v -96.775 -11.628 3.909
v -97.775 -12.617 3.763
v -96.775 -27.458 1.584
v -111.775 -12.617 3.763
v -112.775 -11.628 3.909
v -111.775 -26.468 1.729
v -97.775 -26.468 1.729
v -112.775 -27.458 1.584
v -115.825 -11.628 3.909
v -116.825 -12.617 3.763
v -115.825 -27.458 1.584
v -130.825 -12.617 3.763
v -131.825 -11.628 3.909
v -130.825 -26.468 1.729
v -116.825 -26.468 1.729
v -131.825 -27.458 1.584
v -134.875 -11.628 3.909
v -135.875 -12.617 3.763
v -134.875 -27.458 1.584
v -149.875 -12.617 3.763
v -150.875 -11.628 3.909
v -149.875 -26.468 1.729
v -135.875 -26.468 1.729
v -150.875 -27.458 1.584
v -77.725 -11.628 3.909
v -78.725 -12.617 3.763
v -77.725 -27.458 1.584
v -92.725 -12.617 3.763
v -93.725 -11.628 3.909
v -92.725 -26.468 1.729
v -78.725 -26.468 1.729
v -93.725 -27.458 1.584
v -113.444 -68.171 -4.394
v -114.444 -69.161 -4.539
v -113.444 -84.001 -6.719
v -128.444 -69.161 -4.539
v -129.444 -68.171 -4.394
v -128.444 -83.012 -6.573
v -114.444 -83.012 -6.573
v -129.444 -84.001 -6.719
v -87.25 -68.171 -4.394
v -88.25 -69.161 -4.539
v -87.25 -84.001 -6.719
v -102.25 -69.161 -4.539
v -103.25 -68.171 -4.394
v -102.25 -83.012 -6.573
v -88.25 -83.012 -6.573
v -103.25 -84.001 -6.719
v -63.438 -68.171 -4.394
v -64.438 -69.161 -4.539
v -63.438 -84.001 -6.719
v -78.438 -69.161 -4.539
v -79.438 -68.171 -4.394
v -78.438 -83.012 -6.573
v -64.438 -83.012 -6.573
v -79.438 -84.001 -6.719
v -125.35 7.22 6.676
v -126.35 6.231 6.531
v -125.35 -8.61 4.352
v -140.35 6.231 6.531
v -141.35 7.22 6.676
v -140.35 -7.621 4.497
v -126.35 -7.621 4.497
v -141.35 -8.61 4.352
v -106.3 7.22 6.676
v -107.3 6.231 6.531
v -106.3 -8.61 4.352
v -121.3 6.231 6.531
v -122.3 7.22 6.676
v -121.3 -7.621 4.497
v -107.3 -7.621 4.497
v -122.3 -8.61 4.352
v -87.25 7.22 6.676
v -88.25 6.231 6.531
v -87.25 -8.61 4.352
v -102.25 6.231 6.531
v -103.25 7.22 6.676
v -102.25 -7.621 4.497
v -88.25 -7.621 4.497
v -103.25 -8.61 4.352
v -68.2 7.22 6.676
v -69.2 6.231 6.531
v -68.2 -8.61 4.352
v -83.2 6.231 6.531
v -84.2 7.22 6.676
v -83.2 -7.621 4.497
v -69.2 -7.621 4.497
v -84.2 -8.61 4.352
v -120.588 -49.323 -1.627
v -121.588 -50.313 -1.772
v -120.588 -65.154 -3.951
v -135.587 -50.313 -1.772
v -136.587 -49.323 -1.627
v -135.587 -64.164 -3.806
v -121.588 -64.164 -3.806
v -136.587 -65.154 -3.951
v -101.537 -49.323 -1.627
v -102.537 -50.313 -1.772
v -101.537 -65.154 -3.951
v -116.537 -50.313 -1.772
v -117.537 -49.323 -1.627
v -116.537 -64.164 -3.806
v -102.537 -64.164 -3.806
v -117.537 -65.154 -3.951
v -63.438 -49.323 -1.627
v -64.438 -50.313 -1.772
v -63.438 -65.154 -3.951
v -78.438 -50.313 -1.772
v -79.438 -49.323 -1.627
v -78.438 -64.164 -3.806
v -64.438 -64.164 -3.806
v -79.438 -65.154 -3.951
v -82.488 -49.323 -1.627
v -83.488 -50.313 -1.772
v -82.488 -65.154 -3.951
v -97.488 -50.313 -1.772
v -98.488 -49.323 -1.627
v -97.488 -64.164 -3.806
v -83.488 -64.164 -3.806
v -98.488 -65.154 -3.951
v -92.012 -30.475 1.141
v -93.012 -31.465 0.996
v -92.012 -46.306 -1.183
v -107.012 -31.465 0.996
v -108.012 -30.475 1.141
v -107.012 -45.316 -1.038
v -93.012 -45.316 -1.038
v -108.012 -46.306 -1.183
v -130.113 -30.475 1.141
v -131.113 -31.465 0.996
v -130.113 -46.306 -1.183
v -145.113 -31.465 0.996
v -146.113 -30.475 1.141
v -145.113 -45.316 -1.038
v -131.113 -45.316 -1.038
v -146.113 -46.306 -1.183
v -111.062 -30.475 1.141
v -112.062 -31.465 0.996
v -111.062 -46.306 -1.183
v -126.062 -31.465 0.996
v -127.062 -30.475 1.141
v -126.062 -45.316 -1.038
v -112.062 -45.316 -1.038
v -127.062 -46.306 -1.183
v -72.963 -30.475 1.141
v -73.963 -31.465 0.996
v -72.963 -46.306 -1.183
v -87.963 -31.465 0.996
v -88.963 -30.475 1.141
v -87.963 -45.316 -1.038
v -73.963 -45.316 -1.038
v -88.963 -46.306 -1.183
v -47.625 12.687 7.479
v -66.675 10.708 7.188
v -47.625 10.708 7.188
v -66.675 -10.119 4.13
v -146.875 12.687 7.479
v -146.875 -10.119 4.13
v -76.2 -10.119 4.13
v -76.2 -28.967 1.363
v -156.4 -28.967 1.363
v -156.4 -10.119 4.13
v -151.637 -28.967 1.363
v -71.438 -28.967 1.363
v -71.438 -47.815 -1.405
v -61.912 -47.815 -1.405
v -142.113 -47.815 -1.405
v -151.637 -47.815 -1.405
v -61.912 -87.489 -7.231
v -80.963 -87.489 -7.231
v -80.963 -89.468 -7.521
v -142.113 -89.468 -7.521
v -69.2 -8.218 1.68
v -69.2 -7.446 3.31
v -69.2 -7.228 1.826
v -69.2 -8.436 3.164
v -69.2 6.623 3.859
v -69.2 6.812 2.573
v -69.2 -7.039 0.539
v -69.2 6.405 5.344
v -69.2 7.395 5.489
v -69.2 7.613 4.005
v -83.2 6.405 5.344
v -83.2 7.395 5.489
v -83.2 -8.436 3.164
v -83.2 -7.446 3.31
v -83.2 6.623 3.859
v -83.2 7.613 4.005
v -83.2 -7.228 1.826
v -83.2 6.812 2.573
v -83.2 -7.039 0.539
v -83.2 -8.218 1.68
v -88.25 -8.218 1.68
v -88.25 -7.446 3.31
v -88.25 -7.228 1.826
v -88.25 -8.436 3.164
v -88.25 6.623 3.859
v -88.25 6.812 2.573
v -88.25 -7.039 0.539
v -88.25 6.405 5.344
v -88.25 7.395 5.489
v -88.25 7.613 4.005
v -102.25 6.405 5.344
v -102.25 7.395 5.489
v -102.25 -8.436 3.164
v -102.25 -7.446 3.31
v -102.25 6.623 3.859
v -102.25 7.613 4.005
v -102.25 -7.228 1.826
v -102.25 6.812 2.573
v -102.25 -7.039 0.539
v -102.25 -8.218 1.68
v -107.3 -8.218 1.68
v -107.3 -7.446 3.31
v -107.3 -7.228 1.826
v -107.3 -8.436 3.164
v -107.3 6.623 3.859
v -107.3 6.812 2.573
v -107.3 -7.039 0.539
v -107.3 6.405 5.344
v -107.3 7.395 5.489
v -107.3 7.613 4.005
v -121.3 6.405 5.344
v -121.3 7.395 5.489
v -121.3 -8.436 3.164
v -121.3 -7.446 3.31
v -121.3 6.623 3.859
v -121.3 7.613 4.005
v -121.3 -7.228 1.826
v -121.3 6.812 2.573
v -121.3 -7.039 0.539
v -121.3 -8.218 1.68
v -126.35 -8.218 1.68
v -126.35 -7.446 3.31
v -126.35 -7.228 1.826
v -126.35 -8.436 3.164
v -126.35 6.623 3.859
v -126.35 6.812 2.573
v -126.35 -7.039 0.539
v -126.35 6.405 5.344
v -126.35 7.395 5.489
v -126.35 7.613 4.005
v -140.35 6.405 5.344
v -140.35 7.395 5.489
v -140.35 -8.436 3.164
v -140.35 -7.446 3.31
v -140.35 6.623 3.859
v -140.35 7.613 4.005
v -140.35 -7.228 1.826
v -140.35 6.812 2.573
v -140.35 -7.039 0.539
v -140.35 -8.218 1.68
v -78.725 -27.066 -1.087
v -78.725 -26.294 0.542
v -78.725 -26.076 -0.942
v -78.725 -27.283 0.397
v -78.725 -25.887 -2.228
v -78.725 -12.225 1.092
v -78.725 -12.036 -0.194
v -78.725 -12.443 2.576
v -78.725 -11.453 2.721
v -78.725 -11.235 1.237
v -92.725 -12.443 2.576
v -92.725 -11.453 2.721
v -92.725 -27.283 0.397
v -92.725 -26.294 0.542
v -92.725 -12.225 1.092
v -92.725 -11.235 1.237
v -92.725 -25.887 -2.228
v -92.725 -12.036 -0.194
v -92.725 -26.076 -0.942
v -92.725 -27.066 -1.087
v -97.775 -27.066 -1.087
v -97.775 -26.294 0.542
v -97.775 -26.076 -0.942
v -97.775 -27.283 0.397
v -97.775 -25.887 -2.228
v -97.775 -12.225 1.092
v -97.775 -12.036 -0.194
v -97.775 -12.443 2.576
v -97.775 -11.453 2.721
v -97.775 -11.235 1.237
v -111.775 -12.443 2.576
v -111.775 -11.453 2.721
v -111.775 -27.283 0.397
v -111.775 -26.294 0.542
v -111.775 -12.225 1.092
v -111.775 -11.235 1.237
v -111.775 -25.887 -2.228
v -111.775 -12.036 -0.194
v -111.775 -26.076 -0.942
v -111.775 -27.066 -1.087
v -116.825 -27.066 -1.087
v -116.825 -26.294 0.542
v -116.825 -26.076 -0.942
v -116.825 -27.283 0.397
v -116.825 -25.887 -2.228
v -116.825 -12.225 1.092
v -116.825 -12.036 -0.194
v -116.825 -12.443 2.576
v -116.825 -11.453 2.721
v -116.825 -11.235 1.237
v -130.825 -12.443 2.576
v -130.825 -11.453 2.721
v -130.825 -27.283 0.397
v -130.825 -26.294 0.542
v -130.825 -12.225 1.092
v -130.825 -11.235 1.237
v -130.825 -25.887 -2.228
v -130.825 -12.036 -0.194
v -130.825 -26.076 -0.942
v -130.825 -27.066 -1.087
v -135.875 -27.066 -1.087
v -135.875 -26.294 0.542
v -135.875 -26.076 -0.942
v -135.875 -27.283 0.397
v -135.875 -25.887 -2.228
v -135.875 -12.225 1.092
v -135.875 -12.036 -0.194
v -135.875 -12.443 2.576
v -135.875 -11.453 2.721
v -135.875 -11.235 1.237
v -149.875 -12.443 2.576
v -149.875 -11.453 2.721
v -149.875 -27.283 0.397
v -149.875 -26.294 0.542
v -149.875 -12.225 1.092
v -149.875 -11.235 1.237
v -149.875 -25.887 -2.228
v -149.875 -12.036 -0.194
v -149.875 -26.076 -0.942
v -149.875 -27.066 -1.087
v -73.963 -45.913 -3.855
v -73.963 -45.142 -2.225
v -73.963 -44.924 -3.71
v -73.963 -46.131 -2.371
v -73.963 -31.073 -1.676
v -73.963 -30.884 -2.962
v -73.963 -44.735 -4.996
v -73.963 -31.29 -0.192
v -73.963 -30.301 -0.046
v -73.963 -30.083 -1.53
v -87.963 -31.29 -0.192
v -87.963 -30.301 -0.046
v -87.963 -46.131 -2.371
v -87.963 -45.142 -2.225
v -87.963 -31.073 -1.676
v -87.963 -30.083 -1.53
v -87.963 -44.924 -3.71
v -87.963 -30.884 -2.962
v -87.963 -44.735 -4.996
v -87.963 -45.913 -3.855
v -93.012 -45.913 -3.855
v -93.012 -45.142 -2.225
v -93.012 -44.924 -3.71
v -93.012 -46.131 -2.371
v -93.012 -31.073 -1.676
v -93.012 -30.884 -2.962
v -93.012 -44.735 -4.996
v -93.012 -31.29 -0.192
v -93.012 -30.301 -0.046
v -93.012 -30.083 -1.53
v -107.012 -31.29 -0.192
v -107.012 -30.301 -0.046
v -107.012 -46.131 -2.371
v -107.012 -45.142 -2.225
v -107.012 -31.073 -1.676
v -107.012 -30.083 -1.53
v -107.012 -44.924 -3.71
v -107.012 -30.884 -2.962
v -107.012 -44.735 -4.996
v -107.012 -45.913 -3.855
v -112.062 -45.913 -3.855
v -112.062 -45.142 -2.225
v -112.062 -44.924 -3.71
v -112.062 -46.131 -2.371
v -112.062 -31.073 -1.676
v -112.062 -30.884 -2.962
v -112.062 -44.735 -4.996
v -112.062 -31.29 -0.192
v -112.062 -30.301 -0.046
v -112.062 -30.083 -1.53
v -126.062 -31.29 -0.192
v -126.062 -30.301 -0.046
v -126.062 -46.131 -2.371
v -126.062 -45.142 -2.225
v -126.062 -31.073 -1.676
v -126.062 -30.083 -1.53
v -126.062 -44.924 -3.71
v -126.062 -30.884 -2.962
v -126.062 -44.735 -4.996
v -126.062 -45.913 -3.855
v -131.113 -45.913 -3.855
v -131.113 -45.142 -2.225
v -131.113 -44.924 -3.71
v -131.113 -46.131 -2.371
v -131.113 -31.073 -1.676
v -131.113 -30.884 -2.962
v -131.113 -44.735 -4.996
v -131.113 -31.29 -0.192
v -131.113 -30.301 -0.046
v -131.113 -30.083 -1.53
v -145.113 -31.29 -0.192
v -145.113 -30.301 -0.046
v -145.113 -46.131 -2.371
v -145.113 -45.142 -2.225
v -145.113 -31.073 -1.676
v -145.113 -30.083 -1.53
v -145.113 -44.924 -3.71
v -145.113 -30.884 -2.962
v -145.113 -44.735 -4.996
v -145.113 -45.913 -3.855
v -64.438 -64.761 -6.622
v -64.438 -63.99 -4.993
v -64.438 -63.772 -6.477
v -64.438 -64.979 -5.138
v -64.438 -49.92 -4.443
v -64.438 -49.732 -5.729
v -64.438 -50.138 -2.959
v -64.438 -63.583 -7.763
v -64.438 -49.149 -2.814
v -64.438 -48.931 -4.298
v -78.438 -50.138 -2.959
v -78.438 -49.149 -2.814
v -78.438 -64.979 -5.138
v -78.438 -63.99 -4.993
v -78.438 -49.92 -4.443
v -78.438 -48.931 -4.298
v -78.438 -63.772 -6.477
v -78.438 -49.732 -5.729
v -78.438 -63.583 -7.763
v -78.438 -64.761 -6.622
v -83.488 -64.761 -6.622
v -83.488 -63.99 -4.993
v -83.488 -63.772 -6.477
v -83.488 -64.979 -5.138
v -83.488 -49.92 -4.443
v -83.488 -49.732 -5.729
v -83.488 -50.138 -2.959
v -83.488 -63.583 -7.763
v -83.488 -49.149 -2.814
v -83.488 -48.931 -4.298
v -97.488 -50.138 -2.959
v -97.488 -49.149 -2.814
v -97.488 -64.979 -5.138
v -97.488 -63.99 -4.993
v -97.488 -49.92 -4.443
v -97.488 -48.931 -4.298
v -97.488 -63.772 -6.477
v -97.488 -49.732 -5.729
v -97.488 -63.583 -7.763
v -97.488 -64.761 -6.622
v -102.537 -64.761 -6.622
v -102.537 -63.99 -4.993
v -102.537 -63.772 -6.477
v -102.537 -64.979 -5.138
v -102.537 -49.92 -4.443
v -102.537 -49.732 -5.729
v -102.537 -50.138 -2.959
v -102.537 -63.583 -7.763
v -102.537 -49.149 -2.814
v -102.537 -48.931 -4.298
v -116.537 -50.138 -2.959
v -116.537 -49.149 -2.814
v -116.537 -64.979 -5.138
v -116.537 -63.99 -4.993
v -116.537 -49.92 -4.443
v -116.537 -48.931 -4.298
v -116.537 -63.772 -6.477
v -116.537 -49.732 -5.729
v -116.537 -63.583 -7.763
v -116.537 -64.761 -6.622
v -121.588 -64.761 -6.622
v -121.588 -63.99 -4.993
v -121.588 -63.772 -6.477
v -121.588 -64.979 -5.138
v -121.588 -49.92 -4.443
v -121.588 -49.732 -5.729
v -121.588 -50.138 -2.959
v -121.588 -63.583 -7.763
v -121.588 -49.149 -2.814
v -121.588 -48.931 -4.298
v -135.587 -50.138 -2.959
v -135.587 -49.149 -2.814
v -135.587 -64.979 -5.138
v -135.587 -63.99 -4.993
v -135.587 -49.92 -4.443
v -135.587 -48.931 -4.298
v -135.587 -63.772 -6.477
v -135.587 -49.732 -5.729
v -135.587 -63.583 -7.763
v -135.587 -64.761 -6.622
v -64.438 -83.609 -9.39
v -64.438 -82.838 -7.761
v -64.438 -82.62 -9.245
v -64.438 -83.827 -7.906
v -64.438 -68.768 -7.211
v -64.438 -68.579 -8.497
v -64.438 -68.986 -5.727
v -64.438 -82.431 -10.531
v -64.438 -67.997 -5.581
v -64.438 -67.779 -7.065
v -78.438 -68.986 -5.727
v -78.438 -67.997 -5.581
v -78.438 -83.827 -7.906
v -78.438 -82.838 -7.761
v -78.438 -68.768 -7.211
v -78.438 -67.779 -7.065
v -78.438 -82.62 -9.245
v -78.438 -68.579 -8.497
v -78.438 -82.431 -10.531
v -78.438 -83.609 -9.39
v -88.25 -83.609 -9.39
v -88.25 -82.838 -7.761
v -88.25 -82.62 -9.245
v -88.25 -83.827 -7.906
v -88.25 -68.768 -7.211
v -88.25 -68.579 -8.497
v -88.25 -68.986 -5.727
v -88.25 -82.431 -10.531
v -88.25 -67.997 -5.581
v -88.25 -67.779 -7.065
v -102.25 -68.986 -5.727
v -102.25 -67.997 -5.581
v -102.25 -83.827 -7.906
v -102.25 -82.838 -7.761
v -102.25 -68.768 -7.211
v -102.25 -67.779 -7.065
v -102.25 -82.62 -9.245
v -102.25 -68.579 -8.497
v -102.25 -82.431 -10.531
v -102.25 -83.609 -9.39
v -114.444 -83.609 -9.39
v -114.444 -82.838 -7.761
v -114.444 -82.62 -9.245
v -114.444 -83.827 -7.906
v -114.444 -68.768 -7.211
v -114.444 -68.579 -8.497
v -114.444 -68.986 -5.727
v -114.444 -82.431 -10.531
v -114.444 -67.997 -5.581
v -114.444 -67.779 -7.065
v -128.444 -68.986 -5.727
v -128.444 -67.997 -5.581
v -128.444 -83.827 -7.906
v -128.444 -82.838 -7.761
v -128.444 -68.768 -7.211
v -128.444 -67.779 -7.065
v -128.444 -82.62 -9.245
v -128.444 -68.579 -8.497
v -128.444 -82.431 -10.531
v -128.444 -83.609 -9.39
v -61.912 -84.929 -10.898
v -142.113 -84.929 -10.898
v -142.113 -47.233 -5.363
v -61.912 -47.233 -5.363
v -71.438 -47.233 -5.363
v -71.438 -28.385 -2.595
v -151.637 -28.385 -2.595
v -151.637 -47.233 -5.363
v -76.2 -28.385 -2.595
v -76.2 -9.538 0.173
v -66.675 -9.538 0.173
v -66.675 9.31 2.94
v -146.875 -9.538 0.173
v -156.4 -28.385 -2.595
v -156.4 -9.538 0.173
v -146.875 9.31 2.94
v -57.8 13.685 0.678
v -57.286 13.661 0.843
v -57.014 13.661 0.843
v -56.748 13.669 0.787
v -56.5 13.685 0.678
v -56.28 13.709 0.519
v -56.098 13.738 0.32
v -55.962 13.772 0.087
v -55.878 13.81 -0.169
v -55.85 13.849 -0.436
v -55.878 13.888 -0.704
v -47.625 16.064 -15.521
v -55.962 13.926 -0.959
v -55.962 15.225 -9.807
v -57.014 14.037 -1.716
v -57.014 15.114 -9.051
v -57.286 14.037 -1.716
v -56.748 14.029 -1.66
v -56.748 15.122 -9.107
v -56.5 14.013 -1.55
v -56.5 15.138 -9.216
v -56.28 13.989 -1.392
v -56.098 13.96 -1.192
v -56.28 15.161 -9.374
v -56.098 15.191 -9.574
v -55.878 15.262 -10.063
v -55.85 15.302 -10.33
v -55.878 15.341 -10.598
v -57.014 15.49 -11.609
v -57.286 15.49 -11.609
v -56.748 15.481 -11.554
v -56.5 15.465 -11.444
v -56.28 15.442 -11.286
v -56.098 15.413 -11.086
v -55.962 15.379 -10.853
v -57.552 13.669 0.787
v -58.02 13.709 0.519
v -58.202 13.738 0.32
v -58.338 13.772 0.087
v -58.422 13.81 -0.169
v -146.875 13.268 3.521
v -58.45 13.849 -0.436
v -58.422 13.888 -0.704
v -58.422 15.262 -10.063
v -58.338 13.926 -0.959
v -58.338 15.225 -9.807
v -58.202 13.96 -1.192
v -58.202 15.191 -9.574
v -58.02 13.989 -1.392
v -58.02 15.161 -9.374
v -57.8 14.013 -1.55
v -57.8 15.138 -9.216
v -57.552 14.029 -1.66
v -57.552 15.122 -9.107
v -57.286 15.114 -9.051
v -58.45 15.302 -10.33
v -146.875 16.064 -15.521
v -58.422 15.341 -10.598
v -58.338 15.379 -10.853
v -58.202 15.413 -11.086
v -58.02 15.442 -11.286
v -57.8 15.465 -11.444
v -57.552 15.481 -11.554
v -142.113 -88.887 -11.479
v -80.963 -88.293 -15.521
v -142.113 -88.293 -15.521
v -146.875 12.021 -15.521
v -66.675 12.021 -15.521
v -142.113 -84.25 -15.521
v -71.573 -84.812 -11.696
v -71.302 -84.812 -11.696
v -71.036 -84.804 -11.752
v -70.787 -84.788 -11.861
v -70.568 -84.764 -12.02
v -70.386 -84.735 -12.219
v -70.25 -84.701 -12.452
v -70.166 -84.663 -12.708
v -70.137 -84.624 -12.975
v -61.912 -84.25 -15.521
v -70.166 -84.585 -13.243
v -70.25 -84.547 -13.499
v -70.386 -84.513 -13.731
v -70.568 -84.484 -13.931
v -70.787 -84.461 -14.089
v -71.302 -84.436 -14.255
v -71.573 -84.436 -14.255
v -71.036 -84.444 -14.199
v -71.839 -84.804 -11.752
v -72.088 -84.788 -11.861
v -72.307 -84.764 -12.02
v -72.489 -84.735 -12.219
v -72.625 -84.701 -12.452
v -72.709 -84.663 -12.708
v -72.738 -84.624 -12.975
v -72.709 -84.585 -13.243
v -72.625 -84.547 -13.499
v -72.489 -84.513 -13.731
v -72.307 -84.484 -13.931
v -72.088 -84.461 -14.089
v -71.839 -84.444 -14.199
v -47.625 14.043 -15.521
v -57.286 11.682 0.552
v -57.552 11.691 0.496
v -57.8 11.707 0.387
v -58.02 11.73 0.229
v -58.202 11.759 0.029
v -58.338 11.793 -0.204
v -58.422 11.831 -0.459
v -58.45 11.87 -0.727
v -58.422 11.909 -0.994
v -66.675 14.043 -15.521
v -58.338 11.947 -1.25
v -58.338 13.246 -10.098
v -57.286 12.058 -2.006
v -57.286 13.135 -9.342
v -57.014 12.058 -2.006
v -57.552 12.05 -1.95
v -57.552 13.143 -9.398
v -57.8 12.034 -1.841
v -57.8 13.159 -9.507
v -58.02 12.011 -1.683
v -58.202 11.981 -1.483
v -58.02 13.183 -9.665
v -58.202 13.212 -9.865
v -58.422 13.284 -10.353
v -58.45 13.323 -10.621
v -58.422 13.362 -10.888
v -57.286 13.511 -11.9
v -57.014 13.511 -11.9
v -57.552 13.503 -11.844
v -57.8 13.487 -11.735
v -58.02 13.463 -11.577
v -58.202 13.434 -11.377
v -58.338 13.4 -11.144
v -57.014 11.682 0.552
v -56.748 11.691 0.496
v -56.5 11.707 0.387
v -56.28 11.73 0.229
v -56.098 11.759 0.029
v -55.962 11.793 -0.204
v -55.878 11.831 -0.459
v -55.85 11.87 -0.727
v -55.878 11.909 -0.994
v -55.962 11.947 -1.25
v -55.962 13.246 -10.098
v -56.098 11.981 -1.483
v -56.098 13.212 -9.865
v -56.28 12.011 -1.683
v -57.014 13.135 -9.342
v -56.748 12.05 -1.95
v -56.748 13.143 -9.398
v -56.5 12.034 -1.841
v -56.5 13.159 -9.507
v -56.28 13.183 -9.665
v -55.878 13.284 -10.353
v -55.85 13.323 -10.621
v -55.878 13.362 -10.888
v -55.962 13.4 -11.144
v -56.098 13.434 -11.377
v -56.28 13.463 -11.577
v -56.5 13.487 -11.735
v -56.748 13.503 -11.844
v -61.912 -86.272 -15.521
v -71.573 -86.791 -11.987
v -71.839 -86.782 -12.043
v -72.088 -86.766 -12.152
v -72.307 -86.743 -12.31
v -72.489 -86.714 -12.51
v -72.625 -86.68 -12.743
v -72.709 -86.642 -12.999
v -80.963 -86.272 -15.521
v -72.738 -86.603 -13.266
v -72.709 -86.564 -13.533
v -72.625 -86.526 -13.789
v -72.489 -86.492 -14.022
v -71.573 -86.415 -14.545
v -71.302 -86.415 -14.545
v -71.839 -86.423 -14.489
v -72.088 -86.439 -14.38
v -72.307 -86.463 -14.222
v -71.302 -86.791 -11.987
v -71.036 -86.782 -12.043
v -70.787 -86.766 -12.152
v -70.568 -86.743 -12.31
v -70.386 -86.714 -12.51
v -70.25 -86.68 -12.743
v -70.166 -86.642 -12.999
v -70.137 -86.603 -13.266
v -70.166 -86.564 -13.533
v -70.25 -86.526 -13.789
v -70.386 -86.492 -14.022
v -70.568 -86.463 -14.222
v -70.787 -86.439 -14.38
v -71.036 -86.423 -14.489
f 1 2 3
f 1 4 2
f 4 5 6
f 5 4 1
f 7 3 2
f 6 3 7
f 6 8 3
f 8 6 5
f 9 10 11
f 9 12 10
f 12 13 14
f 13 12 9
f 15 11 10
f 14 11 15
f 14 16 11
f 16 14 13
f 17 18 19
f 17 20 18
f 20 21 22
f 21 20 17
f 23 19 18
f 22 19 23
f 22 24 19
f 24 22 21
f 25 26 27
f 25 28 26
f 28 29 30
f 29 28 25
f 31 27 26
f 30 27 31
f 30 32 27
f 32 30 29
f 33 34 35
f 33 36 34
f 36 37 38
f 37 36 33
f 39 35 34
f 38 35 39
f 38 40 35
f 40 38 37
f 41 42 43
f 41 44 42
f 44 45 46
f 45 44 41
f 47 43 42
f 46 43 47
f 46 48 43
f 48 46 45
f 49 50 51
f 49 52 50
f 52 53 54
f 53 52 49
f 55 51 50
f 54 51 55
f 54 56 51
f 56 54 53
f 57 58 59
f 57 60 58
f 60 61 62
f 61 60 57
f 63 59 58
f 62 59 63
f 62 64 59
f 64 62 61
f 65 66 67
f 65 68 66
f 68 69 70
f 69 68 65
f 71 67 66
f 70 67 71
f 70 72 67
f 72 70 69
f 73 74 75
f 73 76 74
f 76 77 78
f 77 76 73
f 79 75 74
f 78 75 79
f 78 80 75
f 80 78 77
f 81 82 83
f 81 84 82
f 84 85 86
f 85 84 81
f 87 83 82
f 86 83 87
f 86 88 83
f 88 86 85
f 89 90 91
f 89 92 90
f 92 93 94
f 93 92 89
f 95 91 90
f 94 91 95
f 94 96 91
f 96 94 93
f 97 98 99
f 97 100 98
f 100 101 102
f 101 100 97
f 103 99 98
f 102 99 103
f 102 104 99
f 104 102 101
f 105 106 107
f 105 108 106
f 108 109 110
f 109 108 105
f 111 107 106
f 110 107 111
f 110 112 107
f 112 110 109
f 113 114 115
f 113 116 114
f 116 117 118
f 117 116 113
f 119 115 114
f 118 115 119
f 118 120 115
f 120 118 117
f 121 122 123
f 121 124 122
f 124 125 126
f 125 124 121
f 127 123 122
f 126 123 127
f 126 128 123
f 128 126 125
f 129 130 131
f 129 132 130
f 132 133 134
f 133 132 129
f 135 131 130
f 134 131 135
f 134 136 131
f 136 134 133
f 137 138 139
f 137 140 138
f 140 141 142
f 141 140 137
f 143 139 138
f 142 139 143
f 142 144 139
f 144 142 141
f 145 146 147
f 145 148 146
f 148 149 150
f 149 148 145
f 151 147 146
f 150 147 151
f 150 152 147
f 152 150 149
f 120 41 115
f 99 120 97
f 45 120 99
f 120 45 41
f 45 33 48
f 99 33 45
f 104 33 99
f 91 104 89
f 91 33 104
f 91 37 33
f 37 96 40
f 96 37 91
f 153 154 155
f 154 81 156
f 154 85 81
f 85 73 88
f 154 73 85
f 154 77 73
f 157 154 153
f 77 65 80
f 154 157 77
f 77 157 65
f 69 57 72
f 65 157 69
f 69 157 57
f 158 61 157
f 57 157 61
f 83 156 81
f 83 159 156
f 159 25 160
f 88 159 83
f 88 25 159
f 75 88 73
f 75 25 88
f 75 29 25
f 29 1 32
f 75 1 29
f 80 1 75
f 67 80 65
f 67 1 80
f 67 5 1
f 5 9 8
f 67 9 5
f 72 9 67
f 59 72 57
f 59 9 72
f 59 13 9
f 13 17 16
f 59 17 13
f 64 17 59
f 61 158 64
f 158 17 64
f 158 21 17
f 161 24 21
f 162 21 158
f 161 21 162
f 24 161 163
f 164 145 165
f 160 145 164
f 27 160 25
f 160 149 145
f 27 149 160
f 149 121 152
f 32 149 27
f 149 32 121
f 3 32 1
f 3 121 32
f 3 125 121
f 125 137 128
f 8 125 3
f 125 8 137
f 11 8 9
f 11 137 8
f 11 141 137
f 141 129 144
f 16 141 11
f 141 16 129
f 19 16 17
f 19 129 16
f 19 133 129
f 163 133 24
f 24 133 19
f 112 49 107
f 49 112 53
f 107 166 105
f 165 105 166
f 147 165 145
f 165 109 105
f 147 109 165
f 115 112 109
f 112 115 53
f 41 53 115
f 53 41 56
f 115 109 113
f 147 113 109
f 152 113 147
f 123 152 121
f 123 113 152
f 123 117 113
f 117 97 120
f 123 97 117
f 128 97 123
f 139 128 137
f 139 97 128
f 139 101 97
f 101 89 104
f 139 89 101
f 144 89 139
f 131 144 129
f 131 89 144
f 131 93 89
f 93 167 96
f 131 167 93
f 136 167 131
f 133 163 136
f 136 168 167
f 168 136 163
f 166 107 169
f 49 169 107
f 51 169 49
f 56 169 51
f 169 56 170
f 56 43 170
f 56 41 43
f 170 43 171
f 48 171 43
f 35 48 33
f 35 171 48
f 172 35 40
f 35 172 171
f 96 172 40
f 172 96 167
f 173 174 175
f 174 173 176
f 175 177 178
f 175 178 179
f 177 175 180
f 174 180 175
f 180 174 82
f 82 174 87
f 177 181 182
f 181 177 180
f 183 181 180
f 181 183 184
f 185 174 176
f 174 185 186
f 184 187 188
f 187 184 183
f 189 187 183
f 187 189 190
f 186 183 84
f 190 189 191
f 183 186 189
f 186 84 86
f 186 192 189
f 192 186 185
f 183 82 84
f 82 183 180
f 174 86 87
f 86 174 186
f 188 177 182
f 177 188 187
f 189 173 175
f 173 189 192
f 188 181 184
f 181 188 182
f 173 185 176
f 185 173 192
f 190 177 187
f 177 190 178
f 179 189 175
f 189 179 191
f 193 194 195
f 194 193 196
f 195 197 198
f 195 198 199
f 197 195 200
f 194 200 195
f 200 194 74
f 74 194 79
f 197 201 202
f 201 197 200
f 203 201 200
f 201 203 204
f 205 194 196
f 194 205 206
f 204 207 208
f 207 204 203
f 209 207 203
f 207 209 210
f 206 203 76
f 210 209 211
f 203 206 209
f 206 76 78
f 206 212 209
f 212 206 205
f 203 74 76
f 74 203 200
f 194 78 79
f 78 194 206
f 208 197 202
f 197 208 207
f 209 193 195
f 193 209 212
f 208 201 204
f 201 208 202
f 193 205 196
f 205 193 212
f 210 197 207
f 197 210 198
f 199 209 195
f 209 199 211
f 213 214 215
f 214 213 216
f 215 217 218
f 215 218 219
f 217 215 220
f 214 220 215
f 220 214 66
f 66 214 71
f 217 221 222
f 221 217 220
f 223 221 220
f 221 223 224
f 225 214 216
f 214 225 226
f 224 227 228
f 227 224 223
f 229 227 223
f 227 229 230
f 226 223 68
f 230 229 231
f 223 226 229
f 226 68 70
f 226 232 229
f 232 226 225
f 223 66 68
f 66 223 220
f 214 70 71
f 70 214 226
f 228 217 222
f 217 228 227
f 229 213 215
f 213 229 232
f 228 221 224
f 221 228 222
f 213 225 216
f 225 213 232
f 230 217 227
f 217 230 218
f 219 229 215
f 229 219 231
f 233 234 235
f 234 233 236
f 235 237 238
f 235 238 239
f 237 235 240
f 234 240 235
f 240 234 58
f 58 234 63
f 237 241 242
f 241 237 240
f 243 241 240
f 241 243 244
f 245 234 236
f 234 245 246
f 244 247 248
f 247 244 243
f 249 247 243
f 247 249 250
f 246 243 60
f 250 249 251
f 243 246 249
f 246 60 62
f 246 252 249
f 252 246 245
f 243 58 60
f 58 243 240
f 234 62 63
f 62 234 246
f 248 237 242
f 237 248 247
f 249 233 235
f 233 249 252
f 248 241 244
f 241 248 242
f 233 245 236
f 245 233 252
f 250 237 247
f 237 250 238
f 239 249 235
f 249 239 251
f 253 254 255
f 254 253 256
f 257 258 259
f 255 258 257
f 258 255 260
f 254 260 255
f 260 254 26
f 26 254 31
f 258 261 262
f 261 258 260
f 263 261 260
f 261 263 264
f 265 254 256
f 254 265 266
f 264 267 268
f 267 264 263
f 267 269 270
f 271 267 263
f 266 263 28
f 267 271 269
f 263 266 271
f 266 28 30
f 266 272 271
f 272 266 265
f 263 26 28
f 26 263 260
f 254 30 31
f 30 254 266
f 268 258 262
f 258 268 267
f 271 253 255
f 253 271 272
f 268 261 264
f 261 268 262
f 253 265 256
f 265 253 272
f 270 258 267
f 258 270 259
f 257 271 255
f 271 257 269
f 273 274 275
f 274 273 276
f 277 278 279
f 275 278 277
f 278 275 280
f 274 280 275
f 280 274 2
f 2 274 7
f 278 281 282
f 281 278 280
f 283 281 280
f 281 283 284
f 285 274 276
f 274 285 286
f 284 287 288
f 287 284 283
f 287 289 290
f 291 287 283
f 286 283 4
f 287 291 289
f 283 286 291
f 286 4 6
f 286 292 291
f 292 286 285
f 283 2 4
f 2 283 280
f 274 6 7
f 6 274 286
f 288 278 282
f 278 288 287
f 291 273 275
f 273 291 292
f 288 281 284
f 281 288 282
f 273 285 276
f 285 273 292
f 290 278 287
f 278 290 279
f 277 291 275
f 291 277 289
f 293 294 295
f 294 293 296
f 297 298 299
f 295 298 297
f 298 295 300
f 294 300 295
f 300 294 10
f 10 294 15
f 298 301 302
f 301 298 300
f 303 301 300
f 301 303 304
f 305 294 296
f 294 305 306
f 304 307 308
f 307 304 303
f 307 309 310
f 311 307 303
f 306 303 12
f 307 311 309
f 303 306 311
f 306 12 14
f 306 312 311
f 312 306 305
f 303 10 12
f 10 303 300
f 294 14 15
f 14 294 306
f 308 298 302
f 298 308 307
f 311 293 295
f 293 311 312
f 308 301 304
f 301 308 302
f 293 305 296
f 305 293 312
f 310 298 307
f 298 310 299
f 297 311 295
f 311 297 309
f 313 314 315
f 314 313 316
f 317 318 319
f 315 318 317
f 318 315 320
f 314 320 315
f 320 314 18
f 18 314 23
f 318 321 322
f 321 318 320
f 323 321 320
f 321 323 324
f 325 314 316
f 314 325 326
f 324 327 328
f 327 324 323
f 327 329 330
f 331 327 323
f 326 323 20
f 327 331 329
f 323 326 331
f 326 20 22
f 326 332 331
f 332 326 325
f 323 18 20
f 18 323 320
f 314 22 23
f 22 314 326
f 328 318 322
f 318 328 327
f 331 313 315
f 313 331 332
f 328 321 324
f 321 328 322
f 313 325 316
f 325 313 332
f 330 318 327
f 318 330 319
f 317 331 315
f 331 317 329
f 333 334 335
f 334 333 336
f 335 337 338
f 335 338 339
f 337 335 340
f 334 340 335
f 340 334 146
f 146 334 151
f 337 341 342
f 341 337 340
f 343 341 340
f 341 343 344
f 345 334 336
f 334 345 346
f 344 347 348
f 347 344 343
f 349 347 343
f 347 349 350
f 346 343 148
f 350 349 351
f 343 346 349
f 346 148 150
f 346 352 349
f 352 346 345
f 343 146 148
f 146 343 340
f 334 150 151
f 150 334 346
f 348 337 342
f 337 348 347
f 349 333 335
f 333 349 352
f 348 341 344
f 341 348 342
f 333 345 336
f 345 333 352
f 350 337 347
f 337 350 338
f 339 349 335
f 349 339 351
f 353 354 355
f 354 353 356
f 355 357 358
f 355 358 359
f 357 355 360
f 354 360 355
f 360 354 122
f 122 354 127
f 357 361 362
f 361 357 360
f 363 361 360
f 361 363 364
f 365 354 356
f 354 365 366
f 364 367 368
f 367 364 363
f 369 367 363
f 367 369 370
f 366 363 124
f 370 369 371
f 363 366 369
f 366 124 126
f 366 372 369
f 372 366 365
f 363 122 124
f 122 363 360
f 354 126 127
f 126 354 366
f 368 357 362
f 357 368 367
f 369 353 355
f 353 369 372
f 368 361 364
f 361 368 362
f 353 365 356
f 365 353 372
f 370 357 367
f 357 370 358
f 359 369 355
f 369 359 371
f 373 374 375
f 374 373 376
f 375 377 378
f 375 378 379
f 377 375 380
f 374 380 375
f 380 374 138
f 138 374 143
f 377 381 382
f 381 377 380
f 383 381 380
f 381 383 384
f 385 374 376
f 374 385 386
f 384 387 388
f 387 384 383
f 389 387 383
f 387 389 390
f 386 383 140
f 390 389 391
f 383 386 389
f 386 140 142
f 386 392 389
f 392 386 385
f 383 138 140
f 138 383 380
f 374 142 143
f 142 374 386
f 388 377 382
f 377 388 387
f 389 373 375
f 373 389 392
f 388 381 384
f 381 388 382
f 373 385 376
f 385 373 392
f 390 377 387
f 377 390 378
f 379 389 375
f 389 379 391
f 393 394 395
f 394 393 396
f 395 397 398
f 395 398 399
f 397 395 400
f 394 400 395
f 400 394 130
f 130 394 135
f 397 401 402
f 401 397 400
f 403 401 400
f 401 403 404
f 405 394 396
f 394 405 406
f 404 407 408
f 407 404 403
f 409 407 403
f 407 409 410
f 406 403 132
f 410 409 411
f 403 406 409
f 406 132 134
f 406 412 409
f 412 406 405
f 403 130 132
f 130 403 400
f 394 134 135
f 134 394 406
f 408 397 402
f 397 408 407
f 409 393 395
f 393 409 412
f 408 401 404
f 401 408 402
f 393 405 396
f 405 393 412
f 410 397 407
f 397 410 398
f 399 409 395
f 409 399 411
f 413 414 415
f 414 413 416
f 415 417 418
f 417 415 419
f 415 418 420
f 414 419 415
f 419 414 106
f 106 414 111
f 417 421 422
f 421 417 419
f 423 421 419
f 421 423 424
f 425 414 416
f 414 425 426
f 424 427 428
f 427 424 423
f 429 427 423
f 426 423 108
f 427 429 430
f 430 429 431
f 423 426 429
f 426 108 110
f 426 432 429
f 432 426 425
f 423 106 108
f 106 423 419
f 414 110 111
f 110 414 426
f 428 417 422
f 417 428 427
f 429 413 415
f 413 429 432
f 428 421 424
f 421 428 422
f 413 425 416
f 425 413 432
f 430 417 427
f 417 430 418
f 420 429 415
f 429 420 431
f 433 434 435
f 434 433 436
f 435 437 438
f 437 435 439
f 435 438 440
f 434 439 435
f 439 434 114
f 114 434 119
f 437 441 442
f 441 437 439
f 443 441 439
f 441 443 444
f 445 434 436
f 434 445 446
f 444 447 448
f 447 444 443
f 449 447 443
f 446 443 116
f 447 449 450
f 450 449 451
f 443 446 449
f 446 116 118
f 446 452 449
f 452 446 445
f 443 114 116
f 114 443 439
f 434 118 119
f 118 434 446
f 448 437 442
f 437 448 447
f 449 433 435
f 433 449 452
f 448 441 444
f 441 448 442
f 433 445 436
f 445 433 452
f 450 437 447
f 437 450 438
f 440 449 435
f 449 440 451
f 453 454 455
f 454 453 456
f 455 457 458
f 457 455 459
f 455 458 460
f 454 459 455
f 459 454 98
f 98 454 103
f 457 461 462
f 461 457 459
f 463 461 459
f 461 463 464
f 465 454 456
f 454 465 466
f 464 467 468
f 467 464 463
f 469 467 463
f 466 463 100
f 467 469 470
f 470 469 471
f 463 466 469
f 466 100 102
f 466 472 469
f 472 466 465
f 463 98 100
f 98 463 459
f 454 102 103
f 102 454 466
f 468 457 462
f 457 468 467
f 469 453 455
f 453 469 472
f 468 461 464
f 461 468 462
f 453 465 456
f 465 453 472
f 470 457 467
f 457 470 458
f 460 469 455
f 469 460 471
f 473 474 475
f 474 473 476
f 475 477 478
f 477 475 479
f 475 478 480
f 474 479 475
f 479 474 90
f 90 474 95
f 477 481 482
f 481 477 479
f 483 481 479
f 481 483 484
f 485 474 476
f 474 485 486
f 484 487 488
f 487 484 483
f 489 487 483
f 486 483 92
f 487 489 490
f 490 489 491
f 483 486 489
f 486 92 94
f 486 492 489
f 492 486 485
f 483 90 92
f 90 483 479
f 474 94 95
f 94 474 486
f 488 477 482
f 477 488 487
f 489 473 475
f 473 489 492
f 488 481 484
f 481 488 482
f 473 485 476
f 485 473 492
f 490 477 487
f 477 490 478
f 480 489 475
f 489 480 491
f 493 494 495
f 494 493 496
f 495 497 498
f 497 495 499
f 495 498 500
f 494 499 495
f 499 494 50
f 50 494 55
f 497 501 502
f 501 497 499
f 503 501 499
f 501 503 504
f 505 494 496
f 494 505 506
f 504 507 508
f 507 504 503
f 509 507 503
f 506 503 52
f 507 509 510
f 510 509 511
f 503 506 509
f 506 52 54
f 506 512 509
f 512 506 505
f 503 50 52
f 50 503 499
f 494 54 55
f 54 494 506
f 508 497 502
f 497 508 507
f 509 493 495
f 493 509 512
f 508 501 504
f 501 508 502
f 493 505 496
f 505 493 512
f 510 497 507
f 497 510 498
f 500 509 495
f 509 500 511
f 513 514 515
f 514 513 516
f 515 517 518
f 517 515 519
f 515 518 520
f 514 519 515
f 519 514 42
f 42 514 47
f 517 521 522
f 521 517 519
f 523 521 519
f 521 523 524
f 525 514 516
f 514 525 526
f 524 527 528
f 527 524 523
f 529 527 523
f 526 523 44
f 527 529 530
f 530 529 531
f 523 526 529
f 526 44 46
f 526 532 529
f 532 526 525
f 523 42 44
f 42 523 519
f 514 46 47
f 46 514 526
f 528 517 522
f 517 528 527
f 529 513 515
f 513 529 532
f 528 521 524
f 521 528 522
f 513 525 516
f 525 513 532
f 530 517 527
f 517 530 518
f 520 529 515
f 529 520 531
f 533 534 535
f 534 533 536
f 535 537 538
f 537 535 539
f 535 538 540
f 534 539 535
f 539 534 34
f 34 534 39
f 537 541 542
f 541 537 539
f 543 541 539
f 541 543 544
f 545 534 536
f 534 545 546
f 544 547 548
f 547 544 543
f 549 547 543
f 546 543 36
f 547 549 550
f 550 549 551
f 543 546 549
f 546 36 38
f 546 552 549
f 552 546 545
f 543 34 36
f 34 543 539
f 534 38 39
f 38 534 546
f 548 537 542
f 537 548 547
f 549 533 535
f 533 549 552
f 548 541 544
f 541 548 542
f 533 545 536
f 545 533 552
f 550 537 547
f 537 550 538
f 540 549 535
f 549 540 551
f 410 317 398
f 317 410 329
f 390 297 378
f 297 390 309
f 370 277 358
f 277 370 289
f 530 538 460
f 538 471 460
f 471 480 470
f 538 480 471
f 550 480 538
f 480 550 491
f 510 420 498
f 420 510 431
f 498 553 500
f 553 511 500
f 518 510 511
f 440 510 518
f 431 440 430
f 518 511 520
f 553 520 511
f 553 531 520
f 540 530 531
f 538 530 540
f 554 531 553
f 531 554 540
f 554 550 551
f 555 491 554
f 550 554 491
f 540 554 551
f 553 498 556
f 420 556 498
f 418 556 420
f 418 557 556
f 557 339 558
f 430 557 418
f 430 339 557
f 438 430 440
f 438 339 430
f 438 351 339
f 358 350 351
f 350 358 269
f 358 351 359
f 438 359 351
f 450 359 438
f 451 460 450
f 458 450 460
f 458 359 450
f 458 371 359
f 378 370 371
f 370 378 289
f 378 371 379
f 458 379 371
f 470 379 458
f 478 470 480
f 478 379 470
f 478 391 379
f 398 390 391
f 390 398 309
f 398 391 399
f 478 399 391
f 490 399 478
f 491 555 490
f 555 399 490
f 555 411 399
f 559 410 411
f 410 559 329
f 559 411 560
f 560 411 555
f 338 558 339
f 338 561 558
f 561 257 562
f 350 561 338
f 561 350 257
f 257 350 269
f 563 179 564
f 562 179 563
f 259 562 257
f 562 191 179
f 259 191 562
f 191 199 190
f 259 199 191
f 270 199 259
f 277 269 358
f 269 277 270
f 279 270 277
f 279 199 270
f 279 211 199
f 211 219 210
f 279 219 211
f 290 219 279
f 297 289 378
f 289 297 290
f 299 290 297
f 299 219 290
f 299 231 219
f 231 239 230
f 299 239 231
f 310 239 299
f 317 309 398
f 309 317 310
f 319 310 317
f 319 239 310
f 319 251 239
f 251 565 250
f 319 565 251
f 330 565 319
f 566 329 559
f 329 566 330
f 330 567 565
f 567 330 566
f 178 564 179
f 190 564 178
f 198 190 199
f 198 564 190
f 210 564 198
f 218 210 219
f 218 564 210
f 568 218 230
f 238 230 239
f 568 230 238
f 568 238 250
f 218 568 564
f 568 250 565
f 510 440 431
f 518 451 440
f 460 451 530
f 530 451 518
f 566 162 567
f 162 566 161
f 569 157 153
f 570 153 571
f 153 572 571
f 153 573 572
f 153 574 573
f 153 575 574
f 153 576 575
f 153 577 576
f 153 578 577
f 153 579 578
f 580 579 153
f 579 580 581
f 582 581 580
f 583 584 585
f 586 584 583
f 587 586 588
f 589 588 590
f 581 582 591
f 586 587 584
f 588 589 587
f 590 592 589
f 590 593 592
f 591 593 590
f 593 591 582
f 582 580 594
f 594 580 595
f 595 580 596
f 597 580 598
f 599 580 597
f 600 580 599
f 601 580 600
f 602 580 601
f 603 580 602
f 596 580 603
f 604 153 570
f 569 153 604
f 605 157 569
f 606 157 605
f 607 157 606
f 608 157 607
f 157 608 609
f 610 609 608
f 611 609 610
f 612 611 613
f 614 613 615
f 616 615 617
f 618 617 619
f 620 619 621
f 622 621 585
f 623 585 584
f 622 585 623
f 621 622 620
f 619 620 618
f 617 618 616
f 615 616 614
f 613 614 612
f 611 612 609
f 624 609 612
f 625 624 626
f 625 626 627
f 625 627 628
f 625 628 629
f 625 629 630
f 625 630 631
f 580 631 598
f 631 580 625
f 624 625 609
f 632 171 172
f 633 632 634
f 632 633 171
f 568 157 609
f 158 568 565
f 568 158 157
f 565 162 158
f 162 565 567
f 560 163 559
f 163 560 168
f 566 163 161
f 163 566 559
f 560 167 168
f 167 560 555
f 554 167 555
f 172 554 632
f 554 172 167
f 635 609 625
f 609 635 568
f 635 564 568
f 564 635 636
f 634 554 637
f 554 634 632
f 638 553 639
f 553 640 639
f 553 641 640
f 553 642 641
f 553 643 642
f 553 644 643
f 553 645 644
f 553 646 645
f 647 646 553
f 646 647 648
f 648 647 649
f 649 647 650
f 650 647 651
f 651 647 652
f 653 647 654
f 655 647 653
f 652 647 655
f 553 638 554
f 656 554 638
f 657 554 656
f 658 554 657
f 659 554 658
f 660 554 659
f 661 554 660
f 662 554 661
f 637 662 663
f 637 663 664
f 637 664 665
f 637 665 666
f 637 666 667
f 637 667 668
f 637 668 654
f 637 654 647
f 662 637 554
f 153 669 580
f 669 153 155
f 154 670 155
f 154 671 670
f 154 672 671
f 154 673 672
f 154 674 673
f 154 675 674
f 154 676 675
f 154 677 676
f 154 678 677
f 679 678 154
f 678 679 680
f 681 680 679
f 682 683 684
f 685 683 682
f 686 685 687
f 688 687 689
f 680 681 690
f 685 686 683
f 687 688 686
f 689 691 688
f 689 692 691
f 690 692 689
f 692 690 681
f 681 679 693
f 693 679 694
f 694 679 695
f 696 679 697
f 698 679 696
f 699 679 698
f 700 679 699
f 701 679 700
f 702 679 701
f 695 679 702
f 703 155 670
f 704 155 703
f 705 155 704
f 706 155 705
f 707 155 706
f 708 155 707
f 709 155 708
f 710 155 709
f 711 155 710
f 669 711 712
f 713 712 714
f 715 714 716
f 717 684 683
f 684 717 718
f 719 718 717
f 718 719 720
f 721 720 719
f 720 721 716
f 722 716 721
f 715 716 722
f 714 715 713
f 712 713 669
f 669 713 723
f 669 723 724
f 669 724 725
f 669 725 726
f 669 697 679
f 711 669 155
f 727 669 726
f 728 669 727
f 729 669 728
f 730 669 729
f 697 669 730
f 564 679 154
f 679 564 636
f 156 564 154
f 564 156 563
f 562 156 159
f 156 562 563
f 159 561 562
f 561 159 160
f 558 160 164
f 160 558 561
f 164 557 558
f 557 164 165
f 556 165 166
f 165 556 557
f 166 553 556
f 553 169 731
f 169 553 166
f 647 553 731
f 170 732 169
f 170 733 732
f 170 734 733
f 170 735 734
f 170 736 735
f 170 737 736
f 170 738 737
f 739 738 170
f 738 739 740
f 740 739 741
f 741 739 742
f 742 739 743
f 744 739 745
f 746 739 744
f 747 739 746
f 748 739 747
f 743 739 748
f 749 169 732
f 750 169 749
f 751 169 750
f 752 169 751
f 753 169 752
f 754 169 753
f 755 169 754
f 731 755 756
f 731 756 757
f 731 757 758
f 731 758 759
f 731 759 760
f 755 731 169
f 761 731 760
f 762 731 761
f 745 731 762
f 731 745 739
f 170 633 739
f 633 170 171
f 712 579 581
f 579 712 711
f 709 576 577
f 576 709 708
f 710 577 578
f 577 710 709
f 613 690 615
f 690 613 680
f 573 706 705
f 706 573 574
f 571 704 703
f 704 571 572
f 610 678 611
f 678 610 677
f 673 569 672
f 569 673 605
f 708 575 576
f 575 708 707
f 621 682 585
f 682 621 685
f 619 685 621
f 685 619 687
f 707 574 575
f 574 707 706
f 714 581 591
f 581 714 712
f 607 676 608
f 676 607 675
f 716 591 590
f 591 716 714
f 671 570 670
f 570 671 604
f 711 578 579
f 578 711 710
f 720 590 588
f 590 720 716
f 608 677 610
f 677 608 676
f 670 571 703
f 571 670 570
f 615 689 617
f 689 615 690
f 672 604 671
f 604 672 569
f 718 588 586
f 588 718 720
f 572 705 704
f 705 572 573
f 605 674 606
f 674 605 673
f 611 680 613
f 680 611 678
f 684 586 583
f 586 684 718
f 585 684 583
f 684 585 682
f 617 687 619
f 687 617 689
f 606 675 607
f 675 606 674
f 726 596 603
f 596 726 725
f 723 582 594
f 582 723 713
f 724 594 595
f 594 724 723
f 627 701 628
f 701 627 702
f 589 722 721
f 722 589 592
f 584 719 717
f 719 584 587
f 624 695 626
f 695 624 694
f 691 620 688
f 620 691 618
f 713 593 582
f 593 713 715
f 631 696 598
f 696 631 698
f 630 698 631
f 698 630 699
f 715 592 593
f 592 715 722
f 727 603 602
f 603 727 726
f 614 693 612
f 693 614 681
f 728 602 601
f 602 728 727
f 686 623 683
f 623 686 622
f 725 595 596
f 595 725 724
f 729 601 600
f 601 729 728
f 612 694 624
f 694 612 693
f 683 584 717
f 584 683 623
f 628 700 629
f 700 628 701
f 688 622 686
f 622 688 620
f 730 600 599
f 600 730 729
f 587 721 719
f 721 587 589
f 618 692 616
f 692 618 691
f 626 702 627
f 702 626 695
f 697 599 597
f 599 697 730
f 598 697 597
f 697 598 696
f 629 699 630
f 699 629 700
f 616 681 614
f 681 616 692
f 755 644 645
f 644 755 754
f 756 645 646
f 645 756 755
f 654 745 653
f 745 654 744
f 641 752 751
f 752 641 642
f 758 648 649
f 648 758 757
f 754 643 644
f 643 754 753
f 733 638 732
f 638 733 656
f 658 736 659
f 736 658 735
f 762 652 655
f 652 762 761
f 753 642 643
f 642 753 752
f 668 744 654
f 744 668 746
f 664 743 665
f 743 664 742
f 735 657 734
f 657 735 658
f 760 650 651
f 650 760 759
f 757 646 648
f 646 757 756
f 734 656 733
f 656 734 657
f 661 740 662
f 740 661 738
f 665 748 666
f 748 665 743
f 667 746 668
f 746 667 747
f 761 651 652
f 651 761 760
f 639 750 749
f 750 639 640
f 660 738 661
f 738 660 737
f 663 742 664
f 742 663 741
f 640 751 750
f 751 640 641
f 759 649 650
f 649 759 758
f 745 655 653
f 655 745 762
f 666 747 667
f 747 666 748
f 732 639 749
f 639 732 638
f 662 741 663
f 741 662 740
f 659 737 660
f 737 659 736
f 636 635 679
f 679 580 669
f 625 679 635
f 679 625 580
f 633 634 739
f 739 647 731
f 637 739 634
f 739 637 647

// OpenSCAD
// file: pro_micro_house_case.scad
pro_micro_house_w_x = 22;
pro_micro_house_w_y = 54;
pro_micro_house_gpio_area_w_y = 34;

padding_x = 1.5;
padding_y_t = 0.5;
padding_z_t = 1.5;
padding_z_b = 1.5;

pro_micro_house_h = 1.5;
spacer_h = 7;

spacer_l_x = 3.5;
spacer_r_x = 18.5;
spacer_b_y = 36;
spacer_t_y = 52.5;
spacer_r = 1.3;

spacer_scale_inverse = 10;

trrs_y = 42.5;
trrs_w_y = 6.5;
trrs_h = 6.5;

reset_switch_x = 7.5;
reset_switch_y = 34;
reset_switch_w_x = 7;
reset_switch_w_y = 7.5;

pro_micro_house_case();

module pro_micro_house_case() {
    difference() {
        cube([pro_micro_house_w_x + 2 * padding_x, pro_micro_house_w_y + padding_y_t, pro_micro_house_h + spacer_h + padding_z_b + padding_z_t], center = false);
        translate([padding_x, 0, 0]) {
            cube([pro_micro_house_w_x, pro_micro_house_gpio_area_w_y, padding_z_b], center = false);
        }
        translate([padding_x, 0, padding_z_b]) {
            cube([pro_micro_house_w_x, pro_micro_house_w_y + padding_y_t, pro_micro_house_h + spacer_h + padding_z_t], center = false);
        }
        translate([spacer_l_x + padding_x, spacer_b_y, padding_z_b / 2]) {
            scale(1 / spacer_scale_inverse) {
                cylinder(r = spacer_scale_inverse * spacer_r, h = spacer_scale_inverse * padding_z_b, center = true);
            }
        }
        translate([spacer_l_x + padding_x, spacer_t_y, padding_z_b / 2]) {
            scale(1 / spacer_scale_inverse) {
                cylinder(r = spacer_scale_inverse * spacer_r, h = spacer_scale_inverse * padding_z_b, center = true);
            }
        }
        translate([spacer_r_x + padding_x, spacer_b_y, padding_z_b / 2]) {
            scale(1 / spacer_scale_inverse) {
                cylinder(r = spacer_scale_inverse * spacer_r, h = spacer_scale_inverse * padding_z_b, center = true);
            }
        }
        translate([spacer_r_x + padding_x, spacer_t_y, padding_z_b / 2]) {
            scale(1 / spacer_scale_inverse) {
                cylinder(r = spacer_scale_inverse * spacer_r, h = spacer_scale_inverse * padding_z_b, center = true);
            }
        }
        translate([padding_x + reset_switch_x, reset_switch_y, 0]) {
            cube([reset_switch_w_x, reset_switch_w_y, padding_z_b], center = false);
        }
        translate([0, trrs_y, padding_z_b]) {
            cube([padding_x, trrs_w_y, pro_micro_house_h + spacer_h + padding_z_t], center = false);
        }
        translate([pro_micro_house_w_x + padding_x, trrs_y, padding_z_b]) {
            cube([padding_x, trrs_w_y, pro_micro_house_h + spacer_h + padding_z_t], center = false);
        }
    }
}

module pro_micro_cube(y, w_y) {
    translate([padding_x, y - w_y, padding_z_b]) {
        cube([pro_micro_house_w_x, w_y, pro_micro_house_h + spacer_h + padding_z_t], center = false);
    }
}

module trrs_cube_l(w_x) {
    translate([-w_x + padding_x, trrs_y, padding_z_b]) {
        cube([w_x, trrs_w_y, pro_micro_house_h + spacer_h + padding_z_t], center = false);
    }
}

module trrs_cube_r(w_x) {
    translate([pro_micro_house_w_x + padding_x, trrs_y, padding_z_b]) {
        cube([w_x, trrs_w_y, pro_micro_house_h + spacer_h + padding_z_t], center = false);
    }
}

module pro_micro_house_left_padding_cube(w_x) {
    translate([-w_x, 0, 0]) {
        cube([w_x, pro_micro_house_w_y + padding_y_t, pro_micro_house_h + spacer_h + padding_z_b + padding_z_t], center = false);
    }
}

module pro_micro_house_right_padding_cube(w_x) {
    translate([pro_micro_house_w_x + 2 * padding_x, 0, 0]) {
        cube([w_x, pro_micro_house_w_y + padding_y_t, pro_micro_house_h + spacer_h + padding_z_b + padding_z_t], center = false);
    }
}
// file: key_switch.scad
key_switch(0, 0);

module key_switch(x, y) {
    union() {
        h1 = 2;
        translate([x, y, h1 / 2]) {
            cube([16, 16, h1], center=true);
        }
        h2 = 5;
        translate([x, y, h1 + h2 / 2]) {
            cube([16, 16, h2], center=true);
        }
        h3 = 1.2;
        translate([x, y, -h3 / 2]) {
            cube([14, 14, h3], center=true);
        }
        h4 = 1.5;
        translate([x, y, -h3 - h4 / 2]) {
            cube([14, 16, h4], center=true);
        }
        h5 = 10;
        translate([x, y, -h3 - h4 - h5 / 2]) {
            cube([14, 14, h5], center=true);
        }
        key_cap(x, y);
    }
}

module key_cap(x, y) {
    wx1 = 18;
    dx1 = wx1 / 2;

    wy1 = 18;
    dy1 = wy1 / 2;

    wx2 = 12;
    dx2 = wx2 / 2;

    wy2 = 13;
    ry2 = 0.6; // should be greater than 0.5

    z1 = 7;

    z2 = z1 + 10;

    points = [
    [x + dx1, y + dy1, z1], // 0
    [x + dx1, y - dy1, z1], // 1
    [x - dx1, y + dy1, z1], // 2
    [x - dx1, y - dy1, z1], // 3
    [x + dx2, y + ry2 * wy2, z2], // 4
    [x + dx2, y - (1 - ry2) * wy2, z2], // 5
    [x - dx2, y + ry2 * wy2, z2], // 6
    [x - dx2, y - (1 - ry2) * wy2, z2] // 7
    ];
    
    // "All faces must have points ordered in the same direction . OpenSCAD prefers clockwise when looking at each face from outside inwards (from OpenSCAD User Manual/Primitive Solids)"
    faces = [
        [0, 2, 3, 1], // bottom
        [0, 1, 5, 4], // right
        [1, 3, 7, 5], // front
        [3, 2, 6, 7], // left
        [2, 0, 4, 6], // back
        [4, 5, 7, 6]  // top
    ];
    
    polyhedron(points, faces);
}
// main file
use <key_switch.scad>
use <pro_micro_house_case.scad>

w_unit = 19.05; // unit width

y1 = 0;           // row1
y2 = -w_unit;     // row2
y3 = -2 * w_unit; // row3
y4 = -3 * w_unit; // row4
y5 = -4 * w_unit; // row5

plate_padding_x_l = 4; // plate padding x left 
plate_padding_x_r = 4; // plate padding x right
plate_padding_y_t = 4; // plate padding y top
plate_padding_y_b = 4; // plate padding y bottom

plate_w_x = plate_padding_x_l + w_unit / 2 + 8 * w_unit + plate_padding_x_r;
plate_w_y = plate_padding_y_t + w_unit / 2 + 4.5 * w_unit + plate_padding_y_b;
plate_h = 4;

foot_w = 4;
foot_h = 30;

keyboard_h_low = 10;
keyboard_h_high = 25;

plate_rotation_x = asin((keyboard_h_high - keyboard_h_low) / plate_w_y);

base_cube_dz = -(plate_w_y * (keyboard_h_high + keyboard_h_low) * sin(plate_rotation_x) / (keyboard_h_high - keyboard_h_low) - plate_h * cos(plate_rotation_x)) / 2;

screw_r = 1.3;
screw_scale_inverse = 10;

pro_micro_dy = 0.2;

keyboard();

module keyboard() {
    difference() {
        /*
        union() {
            keyboard_case();
            pro_micro();
        }
        */
        keyboard_case();
        translate([w_unit / 2 + plate_padding_x_l, -w_unit / 2 - plate_padding_y_t + pro_micro_dy, base_cube_dz]) {
            rotate([0, 0, 90]) {
                trrs_cube_r(2 * plate_padding_y_t);
            }
        }
        translate([w_unit / 2 + plate_padding_x_l, -w_unit / 2 - plate_padding_y_t + pro_micro_dy, base_cube_dz]) {
            rotate([0, 0, 90]) {
                pro_micro_cube(plate_padding_x_r, 2 * plate_padding_x_r);
            }
        }
    }
}

module pro_micro() {
    translate([w_unit / 2 + plate_padding_x_r, -w_unit / 2 - plate_padding_y_t + pro_micro_dy, base_cube_dz]) {
        rotate([0, 0, 90]) {
            union() {
                pro_micro_house_right_padding_cube(1);
                pro_micro_house_case();
            }
        }
    }
}

module keyboard_case() {
    difference() {
        untranslate_plate_origin_in_yz_plane() {
            rotate([plate_rotation_x, 0, 0]) {
                translate_plate_origin_in_yz_plane() {
                    difference() {
                        union() {
                            keyboard_plate();
                            foot();
                        }
                        right_margins();
                        screws();
                    }
                }
            }
        }
        base_cube();
    }
}

module base_cube() {
    base_cube_h = 100;
    base_cube_extension_y = 10;
    translate_from_origin_to_plate_right_bottom() {
        translate([-plate_w_x, 0, base_cube_dz - base_cube_h]) {
            cube([plate_w_x, plate_w_y + base_cube_extension_y, base_cube_h], center = false);
        } 
    }
}

module screws() {
    dz_screw_top_1 = -8;
    dz_screw_top_2 = -18;

    dz_screw_bottom = -6.1;

    // foot top
    translate([-plate_padding_x_r - 3 * w_unit - w_unit / 2 , -foot_w / 2, dz_screw_top_1]) {
        translate_from_origin_to_plate_right_top() {
            screw();
        }
    }
    translate([-plate_padding_x_r - 3 * w_unit - w_unit / 2 , -foot_w / 2, dz_screw_top_2]) {
        translate_from_origin_to_plate_right_top() {
            screw();
        }
    }

    // foot bottom
    translate([-plate_padding_x_r - 3.75 * w_unit - w_unit / 2, foot_w / 2, dz_screw_bottom]) {
        translate_from_origin_to_plate_right_bottom() {
            screw();
        }
    }
}

module screw() {
    rotate([90, 0, 0]) {
        scale(1 / screw_scale_inverse) {
            cylinder(r = screw_scale_inverse * screw_r, h = screw_scale_inverse * foot_w, center = true);
        }
    }
}

module right_margins() {
    margin = 5 * w_unit;

    // padding top
    padding_top_cube_with_right_margin(-2 * w_unit, y1 + w_unit / 2 + 3 * plate_padding_y_t / 4, 2 * foot_h, margin);
    padding_top_cube_with_right_margin(-3 * w_unit, y1 + w_unit / 2 + plate_padding_y_t / 4, 2 * foot_h, margin);

    // row 1
    unit_cube_with_right_margin(-3 * w_unit, y1, margin);

    // row 2
    unit_cube_with_right_margin(-(1.5 + 2) * w_unit, y2, margin);

    // row 3
    unit_cube_with_right_margin(-(2.25 + 1) * w_unit, y3, margin);

    // row 4
    unit_cube_with_right_margin(-2.75 * w_unit, y4, margin);
    
    // row 5
    unit_cube_with_right_margin(-3.75 * w_unit + w_unit, y5, margin);
    
    // padding bottom
    padding_bottom_cube_with_right_margin(-3.75 * w_unit + w_unit, y5 - w_unit / 2 - plate_padding_y_b / 4, 2 * foot_h, margin);
    padding_bottom_cube_with_right_margin(-3.75 * w_unit, y5 - w_unit / 2 - 3 * plate_padding_y_t / 4, 2 * foot_h, margin);
}

module foot() {
    union() {
        dz = -plate_h - foot_h;

         // top
        translate_from_origin_to_plate_right_top() {
            translate([-plate_w_x + w_unit / 2, -foot_w, dz]) {
                cube([plate_w_x - w_unit / 2, foot_w, foot_h], center = false);
            }
        }

        /*
        // right
        translate_from_origin_to_plate_right_bottom() {
            translate([-foot_w, 0, dz]) {
                cube([foot_w, plate_w_y, foot_h], center = false);
            }
        }
        */

        // bottom
        translate_from_origin_to_plate_right_bottom() {
            translate([-plate_w_x + w_unit * 0.75, 0, dz]) {
                cube([plate_w_x - w_unit * 0.75, foot_w, foot_h], center = false);
            }
        }
    }
}

module keyboard_plate() {
    difference() {    
        plate();
        key_switches();
        unit_cube(-8 * w_unit - plate_padding_x_l, y1 + w_unit);
        unit_cube(-8 * w_unit - plate_padding_x_l, y1);
        unit_cube(-(2.25 + 6) * w_unit - plate_padding_x_l, y3);
        unit_cube(-(2.75 + 5) * w_unit - plate_padding_x_l, y4);
        unit_cube(-(2.75 + 5) * w_unit - plate_padding_x_l, y5);
        unit_cube(-(2.75 + 5) * w_unit - plate_padding_x_l, y5 - w_unit);
    }
}

module plate() {
    translate([-plate_w_x + w_unit / 2 + plate_padding_x_r, -plate_w_y + plate_padding_y_t + w_unit / 2, -plate_h]) {
        cube([plate_w_x, plate_w_y, plate_h], center = false);
    }
}

module key_switches() {
    // row 1
    y1 = 0;
    for (i = [0:7]) {
        key_switch(-i * w_unit, y1);
    }

    // row 2
    y2 = -w_unit;
    key_switch(-0.25 * w_unit, y2);
    for (i = [0:6]) {
        key_switch(-(1.5 + i) * w_unit, y2);
    }

    // row 3
    y3 = -2 * w_unit;
    key_switch(-0.625 * w_unit, y3);
    for (i = [0:5]) {
        key_switch(-(2.25 + i) * w_unit, y3);
    }

    // row 4
    y4 = -3 * w_unit;
    key_switch(0, y4);
    key_switch(-1.375 * w_unit, y4);
    for (i = [0:4]) {
        key_switch(-(2.75 + i) * w_unit, y4);
    }
    
    // row 5
    y5 = -4 * w_unit;
    key_switch(-2.5 * w_unit, y5);
    key_switch(-3.75 * w_unit, y5);
    key_switch(-5 * w_unit, y5);
    key_switch(-6.375 * w_unit, y5);
}

module unit_cube(x, y) {
    translate([x, y, 0]) {
        cube([w_unit, w_unit, w_unit], center = true);
    }
}

module unit_cube_with_right_margin(x, y, m) {
    translate([x, y, 0]) {
        translate([-w_unit / 2, -w_unit / 2, -w_unit / 2]) {
            cube([w_unit + m, w_unit, w_unit], center = false);
        }
    }
}

module padding_top_cube_with_right_margin(x, y, h, m) {
    translate([x, y, 0]) {
        translate([-w_unit / 2, -plate_padding_y_t / 4, -h / 2]) {
            cube([w_unit + m, plate_padding_y_t / 2, h], center = false);
        }
    }
}

module padding_bottom_cube_with_right_margin(x, y, h, m) {
    translate([x, y, 0]) {
        translate([-w_unit / 2, -plate_padding_y_b / 4, -h / 2]) {
            cube([w_unit + m, plate_padding_y_b / 2, h], center = false);
        }
    }
}

module unit_cube_with_left_margin(x, y, m) {
    translate([x, y, 0]) {
        translate([-w_unit / 2 - m, -w_unit / 2, -w_unit / 2]) {
            cube([w_unit + m, w_unit, w_unit], center = false);
        }
    }
}

module padding_top_cube_with_left_margin(x, y, h, m) {
    translate([x, y, 0]) {
        translate([-w_unit / 2 - m, -plate_padding_y_t / 4, -h / 2]) {
            cube([w_unit + m, plate_padding_y_t / 2, h], center = false);
        }
    }
}

module padding_bottom_cube_with_left_margin(x, y, h, m) {
    translate([x, y, 0]) {
        translate([-w_unit / 2 - m, -plate_padding_y_b / 4, -h / 2]) {
            cube([w_unit + m, plate_padding_y_b / 2, h], center = false);
        }
    }
}

// operator modules

module translate_plate_origin_in_yz_plane() {
    translate([0, plate_w_y / 2, plate_h / 2]) {
        translate([0, -w_unit / 2 - plate_padding_y_t, 0]) {
            children();
        }
    }
}

module untranslate_plate_origin_in_yz_plane() {
    translate([0, w_unit / 2 + plate_padding_y_t, 0]) {
        translate([0, -plate_w_y / 2, -plate_h / 2]) {
            children();
        }
    }
}

module translate_from_origin_to_plate_right_bottom() {
    translate_from_origin_to_plate_right_top() {
        translate([0, -plate_w_y, 0]) {
            children();
        }
    }
}

module translate_from_origin_to_plate_right_top() {
    translate([w_unit / 2 + plate_padding_x_r, w_unit / 2 + plate_padding_y_t, 0]) {
        children();
    }
}
